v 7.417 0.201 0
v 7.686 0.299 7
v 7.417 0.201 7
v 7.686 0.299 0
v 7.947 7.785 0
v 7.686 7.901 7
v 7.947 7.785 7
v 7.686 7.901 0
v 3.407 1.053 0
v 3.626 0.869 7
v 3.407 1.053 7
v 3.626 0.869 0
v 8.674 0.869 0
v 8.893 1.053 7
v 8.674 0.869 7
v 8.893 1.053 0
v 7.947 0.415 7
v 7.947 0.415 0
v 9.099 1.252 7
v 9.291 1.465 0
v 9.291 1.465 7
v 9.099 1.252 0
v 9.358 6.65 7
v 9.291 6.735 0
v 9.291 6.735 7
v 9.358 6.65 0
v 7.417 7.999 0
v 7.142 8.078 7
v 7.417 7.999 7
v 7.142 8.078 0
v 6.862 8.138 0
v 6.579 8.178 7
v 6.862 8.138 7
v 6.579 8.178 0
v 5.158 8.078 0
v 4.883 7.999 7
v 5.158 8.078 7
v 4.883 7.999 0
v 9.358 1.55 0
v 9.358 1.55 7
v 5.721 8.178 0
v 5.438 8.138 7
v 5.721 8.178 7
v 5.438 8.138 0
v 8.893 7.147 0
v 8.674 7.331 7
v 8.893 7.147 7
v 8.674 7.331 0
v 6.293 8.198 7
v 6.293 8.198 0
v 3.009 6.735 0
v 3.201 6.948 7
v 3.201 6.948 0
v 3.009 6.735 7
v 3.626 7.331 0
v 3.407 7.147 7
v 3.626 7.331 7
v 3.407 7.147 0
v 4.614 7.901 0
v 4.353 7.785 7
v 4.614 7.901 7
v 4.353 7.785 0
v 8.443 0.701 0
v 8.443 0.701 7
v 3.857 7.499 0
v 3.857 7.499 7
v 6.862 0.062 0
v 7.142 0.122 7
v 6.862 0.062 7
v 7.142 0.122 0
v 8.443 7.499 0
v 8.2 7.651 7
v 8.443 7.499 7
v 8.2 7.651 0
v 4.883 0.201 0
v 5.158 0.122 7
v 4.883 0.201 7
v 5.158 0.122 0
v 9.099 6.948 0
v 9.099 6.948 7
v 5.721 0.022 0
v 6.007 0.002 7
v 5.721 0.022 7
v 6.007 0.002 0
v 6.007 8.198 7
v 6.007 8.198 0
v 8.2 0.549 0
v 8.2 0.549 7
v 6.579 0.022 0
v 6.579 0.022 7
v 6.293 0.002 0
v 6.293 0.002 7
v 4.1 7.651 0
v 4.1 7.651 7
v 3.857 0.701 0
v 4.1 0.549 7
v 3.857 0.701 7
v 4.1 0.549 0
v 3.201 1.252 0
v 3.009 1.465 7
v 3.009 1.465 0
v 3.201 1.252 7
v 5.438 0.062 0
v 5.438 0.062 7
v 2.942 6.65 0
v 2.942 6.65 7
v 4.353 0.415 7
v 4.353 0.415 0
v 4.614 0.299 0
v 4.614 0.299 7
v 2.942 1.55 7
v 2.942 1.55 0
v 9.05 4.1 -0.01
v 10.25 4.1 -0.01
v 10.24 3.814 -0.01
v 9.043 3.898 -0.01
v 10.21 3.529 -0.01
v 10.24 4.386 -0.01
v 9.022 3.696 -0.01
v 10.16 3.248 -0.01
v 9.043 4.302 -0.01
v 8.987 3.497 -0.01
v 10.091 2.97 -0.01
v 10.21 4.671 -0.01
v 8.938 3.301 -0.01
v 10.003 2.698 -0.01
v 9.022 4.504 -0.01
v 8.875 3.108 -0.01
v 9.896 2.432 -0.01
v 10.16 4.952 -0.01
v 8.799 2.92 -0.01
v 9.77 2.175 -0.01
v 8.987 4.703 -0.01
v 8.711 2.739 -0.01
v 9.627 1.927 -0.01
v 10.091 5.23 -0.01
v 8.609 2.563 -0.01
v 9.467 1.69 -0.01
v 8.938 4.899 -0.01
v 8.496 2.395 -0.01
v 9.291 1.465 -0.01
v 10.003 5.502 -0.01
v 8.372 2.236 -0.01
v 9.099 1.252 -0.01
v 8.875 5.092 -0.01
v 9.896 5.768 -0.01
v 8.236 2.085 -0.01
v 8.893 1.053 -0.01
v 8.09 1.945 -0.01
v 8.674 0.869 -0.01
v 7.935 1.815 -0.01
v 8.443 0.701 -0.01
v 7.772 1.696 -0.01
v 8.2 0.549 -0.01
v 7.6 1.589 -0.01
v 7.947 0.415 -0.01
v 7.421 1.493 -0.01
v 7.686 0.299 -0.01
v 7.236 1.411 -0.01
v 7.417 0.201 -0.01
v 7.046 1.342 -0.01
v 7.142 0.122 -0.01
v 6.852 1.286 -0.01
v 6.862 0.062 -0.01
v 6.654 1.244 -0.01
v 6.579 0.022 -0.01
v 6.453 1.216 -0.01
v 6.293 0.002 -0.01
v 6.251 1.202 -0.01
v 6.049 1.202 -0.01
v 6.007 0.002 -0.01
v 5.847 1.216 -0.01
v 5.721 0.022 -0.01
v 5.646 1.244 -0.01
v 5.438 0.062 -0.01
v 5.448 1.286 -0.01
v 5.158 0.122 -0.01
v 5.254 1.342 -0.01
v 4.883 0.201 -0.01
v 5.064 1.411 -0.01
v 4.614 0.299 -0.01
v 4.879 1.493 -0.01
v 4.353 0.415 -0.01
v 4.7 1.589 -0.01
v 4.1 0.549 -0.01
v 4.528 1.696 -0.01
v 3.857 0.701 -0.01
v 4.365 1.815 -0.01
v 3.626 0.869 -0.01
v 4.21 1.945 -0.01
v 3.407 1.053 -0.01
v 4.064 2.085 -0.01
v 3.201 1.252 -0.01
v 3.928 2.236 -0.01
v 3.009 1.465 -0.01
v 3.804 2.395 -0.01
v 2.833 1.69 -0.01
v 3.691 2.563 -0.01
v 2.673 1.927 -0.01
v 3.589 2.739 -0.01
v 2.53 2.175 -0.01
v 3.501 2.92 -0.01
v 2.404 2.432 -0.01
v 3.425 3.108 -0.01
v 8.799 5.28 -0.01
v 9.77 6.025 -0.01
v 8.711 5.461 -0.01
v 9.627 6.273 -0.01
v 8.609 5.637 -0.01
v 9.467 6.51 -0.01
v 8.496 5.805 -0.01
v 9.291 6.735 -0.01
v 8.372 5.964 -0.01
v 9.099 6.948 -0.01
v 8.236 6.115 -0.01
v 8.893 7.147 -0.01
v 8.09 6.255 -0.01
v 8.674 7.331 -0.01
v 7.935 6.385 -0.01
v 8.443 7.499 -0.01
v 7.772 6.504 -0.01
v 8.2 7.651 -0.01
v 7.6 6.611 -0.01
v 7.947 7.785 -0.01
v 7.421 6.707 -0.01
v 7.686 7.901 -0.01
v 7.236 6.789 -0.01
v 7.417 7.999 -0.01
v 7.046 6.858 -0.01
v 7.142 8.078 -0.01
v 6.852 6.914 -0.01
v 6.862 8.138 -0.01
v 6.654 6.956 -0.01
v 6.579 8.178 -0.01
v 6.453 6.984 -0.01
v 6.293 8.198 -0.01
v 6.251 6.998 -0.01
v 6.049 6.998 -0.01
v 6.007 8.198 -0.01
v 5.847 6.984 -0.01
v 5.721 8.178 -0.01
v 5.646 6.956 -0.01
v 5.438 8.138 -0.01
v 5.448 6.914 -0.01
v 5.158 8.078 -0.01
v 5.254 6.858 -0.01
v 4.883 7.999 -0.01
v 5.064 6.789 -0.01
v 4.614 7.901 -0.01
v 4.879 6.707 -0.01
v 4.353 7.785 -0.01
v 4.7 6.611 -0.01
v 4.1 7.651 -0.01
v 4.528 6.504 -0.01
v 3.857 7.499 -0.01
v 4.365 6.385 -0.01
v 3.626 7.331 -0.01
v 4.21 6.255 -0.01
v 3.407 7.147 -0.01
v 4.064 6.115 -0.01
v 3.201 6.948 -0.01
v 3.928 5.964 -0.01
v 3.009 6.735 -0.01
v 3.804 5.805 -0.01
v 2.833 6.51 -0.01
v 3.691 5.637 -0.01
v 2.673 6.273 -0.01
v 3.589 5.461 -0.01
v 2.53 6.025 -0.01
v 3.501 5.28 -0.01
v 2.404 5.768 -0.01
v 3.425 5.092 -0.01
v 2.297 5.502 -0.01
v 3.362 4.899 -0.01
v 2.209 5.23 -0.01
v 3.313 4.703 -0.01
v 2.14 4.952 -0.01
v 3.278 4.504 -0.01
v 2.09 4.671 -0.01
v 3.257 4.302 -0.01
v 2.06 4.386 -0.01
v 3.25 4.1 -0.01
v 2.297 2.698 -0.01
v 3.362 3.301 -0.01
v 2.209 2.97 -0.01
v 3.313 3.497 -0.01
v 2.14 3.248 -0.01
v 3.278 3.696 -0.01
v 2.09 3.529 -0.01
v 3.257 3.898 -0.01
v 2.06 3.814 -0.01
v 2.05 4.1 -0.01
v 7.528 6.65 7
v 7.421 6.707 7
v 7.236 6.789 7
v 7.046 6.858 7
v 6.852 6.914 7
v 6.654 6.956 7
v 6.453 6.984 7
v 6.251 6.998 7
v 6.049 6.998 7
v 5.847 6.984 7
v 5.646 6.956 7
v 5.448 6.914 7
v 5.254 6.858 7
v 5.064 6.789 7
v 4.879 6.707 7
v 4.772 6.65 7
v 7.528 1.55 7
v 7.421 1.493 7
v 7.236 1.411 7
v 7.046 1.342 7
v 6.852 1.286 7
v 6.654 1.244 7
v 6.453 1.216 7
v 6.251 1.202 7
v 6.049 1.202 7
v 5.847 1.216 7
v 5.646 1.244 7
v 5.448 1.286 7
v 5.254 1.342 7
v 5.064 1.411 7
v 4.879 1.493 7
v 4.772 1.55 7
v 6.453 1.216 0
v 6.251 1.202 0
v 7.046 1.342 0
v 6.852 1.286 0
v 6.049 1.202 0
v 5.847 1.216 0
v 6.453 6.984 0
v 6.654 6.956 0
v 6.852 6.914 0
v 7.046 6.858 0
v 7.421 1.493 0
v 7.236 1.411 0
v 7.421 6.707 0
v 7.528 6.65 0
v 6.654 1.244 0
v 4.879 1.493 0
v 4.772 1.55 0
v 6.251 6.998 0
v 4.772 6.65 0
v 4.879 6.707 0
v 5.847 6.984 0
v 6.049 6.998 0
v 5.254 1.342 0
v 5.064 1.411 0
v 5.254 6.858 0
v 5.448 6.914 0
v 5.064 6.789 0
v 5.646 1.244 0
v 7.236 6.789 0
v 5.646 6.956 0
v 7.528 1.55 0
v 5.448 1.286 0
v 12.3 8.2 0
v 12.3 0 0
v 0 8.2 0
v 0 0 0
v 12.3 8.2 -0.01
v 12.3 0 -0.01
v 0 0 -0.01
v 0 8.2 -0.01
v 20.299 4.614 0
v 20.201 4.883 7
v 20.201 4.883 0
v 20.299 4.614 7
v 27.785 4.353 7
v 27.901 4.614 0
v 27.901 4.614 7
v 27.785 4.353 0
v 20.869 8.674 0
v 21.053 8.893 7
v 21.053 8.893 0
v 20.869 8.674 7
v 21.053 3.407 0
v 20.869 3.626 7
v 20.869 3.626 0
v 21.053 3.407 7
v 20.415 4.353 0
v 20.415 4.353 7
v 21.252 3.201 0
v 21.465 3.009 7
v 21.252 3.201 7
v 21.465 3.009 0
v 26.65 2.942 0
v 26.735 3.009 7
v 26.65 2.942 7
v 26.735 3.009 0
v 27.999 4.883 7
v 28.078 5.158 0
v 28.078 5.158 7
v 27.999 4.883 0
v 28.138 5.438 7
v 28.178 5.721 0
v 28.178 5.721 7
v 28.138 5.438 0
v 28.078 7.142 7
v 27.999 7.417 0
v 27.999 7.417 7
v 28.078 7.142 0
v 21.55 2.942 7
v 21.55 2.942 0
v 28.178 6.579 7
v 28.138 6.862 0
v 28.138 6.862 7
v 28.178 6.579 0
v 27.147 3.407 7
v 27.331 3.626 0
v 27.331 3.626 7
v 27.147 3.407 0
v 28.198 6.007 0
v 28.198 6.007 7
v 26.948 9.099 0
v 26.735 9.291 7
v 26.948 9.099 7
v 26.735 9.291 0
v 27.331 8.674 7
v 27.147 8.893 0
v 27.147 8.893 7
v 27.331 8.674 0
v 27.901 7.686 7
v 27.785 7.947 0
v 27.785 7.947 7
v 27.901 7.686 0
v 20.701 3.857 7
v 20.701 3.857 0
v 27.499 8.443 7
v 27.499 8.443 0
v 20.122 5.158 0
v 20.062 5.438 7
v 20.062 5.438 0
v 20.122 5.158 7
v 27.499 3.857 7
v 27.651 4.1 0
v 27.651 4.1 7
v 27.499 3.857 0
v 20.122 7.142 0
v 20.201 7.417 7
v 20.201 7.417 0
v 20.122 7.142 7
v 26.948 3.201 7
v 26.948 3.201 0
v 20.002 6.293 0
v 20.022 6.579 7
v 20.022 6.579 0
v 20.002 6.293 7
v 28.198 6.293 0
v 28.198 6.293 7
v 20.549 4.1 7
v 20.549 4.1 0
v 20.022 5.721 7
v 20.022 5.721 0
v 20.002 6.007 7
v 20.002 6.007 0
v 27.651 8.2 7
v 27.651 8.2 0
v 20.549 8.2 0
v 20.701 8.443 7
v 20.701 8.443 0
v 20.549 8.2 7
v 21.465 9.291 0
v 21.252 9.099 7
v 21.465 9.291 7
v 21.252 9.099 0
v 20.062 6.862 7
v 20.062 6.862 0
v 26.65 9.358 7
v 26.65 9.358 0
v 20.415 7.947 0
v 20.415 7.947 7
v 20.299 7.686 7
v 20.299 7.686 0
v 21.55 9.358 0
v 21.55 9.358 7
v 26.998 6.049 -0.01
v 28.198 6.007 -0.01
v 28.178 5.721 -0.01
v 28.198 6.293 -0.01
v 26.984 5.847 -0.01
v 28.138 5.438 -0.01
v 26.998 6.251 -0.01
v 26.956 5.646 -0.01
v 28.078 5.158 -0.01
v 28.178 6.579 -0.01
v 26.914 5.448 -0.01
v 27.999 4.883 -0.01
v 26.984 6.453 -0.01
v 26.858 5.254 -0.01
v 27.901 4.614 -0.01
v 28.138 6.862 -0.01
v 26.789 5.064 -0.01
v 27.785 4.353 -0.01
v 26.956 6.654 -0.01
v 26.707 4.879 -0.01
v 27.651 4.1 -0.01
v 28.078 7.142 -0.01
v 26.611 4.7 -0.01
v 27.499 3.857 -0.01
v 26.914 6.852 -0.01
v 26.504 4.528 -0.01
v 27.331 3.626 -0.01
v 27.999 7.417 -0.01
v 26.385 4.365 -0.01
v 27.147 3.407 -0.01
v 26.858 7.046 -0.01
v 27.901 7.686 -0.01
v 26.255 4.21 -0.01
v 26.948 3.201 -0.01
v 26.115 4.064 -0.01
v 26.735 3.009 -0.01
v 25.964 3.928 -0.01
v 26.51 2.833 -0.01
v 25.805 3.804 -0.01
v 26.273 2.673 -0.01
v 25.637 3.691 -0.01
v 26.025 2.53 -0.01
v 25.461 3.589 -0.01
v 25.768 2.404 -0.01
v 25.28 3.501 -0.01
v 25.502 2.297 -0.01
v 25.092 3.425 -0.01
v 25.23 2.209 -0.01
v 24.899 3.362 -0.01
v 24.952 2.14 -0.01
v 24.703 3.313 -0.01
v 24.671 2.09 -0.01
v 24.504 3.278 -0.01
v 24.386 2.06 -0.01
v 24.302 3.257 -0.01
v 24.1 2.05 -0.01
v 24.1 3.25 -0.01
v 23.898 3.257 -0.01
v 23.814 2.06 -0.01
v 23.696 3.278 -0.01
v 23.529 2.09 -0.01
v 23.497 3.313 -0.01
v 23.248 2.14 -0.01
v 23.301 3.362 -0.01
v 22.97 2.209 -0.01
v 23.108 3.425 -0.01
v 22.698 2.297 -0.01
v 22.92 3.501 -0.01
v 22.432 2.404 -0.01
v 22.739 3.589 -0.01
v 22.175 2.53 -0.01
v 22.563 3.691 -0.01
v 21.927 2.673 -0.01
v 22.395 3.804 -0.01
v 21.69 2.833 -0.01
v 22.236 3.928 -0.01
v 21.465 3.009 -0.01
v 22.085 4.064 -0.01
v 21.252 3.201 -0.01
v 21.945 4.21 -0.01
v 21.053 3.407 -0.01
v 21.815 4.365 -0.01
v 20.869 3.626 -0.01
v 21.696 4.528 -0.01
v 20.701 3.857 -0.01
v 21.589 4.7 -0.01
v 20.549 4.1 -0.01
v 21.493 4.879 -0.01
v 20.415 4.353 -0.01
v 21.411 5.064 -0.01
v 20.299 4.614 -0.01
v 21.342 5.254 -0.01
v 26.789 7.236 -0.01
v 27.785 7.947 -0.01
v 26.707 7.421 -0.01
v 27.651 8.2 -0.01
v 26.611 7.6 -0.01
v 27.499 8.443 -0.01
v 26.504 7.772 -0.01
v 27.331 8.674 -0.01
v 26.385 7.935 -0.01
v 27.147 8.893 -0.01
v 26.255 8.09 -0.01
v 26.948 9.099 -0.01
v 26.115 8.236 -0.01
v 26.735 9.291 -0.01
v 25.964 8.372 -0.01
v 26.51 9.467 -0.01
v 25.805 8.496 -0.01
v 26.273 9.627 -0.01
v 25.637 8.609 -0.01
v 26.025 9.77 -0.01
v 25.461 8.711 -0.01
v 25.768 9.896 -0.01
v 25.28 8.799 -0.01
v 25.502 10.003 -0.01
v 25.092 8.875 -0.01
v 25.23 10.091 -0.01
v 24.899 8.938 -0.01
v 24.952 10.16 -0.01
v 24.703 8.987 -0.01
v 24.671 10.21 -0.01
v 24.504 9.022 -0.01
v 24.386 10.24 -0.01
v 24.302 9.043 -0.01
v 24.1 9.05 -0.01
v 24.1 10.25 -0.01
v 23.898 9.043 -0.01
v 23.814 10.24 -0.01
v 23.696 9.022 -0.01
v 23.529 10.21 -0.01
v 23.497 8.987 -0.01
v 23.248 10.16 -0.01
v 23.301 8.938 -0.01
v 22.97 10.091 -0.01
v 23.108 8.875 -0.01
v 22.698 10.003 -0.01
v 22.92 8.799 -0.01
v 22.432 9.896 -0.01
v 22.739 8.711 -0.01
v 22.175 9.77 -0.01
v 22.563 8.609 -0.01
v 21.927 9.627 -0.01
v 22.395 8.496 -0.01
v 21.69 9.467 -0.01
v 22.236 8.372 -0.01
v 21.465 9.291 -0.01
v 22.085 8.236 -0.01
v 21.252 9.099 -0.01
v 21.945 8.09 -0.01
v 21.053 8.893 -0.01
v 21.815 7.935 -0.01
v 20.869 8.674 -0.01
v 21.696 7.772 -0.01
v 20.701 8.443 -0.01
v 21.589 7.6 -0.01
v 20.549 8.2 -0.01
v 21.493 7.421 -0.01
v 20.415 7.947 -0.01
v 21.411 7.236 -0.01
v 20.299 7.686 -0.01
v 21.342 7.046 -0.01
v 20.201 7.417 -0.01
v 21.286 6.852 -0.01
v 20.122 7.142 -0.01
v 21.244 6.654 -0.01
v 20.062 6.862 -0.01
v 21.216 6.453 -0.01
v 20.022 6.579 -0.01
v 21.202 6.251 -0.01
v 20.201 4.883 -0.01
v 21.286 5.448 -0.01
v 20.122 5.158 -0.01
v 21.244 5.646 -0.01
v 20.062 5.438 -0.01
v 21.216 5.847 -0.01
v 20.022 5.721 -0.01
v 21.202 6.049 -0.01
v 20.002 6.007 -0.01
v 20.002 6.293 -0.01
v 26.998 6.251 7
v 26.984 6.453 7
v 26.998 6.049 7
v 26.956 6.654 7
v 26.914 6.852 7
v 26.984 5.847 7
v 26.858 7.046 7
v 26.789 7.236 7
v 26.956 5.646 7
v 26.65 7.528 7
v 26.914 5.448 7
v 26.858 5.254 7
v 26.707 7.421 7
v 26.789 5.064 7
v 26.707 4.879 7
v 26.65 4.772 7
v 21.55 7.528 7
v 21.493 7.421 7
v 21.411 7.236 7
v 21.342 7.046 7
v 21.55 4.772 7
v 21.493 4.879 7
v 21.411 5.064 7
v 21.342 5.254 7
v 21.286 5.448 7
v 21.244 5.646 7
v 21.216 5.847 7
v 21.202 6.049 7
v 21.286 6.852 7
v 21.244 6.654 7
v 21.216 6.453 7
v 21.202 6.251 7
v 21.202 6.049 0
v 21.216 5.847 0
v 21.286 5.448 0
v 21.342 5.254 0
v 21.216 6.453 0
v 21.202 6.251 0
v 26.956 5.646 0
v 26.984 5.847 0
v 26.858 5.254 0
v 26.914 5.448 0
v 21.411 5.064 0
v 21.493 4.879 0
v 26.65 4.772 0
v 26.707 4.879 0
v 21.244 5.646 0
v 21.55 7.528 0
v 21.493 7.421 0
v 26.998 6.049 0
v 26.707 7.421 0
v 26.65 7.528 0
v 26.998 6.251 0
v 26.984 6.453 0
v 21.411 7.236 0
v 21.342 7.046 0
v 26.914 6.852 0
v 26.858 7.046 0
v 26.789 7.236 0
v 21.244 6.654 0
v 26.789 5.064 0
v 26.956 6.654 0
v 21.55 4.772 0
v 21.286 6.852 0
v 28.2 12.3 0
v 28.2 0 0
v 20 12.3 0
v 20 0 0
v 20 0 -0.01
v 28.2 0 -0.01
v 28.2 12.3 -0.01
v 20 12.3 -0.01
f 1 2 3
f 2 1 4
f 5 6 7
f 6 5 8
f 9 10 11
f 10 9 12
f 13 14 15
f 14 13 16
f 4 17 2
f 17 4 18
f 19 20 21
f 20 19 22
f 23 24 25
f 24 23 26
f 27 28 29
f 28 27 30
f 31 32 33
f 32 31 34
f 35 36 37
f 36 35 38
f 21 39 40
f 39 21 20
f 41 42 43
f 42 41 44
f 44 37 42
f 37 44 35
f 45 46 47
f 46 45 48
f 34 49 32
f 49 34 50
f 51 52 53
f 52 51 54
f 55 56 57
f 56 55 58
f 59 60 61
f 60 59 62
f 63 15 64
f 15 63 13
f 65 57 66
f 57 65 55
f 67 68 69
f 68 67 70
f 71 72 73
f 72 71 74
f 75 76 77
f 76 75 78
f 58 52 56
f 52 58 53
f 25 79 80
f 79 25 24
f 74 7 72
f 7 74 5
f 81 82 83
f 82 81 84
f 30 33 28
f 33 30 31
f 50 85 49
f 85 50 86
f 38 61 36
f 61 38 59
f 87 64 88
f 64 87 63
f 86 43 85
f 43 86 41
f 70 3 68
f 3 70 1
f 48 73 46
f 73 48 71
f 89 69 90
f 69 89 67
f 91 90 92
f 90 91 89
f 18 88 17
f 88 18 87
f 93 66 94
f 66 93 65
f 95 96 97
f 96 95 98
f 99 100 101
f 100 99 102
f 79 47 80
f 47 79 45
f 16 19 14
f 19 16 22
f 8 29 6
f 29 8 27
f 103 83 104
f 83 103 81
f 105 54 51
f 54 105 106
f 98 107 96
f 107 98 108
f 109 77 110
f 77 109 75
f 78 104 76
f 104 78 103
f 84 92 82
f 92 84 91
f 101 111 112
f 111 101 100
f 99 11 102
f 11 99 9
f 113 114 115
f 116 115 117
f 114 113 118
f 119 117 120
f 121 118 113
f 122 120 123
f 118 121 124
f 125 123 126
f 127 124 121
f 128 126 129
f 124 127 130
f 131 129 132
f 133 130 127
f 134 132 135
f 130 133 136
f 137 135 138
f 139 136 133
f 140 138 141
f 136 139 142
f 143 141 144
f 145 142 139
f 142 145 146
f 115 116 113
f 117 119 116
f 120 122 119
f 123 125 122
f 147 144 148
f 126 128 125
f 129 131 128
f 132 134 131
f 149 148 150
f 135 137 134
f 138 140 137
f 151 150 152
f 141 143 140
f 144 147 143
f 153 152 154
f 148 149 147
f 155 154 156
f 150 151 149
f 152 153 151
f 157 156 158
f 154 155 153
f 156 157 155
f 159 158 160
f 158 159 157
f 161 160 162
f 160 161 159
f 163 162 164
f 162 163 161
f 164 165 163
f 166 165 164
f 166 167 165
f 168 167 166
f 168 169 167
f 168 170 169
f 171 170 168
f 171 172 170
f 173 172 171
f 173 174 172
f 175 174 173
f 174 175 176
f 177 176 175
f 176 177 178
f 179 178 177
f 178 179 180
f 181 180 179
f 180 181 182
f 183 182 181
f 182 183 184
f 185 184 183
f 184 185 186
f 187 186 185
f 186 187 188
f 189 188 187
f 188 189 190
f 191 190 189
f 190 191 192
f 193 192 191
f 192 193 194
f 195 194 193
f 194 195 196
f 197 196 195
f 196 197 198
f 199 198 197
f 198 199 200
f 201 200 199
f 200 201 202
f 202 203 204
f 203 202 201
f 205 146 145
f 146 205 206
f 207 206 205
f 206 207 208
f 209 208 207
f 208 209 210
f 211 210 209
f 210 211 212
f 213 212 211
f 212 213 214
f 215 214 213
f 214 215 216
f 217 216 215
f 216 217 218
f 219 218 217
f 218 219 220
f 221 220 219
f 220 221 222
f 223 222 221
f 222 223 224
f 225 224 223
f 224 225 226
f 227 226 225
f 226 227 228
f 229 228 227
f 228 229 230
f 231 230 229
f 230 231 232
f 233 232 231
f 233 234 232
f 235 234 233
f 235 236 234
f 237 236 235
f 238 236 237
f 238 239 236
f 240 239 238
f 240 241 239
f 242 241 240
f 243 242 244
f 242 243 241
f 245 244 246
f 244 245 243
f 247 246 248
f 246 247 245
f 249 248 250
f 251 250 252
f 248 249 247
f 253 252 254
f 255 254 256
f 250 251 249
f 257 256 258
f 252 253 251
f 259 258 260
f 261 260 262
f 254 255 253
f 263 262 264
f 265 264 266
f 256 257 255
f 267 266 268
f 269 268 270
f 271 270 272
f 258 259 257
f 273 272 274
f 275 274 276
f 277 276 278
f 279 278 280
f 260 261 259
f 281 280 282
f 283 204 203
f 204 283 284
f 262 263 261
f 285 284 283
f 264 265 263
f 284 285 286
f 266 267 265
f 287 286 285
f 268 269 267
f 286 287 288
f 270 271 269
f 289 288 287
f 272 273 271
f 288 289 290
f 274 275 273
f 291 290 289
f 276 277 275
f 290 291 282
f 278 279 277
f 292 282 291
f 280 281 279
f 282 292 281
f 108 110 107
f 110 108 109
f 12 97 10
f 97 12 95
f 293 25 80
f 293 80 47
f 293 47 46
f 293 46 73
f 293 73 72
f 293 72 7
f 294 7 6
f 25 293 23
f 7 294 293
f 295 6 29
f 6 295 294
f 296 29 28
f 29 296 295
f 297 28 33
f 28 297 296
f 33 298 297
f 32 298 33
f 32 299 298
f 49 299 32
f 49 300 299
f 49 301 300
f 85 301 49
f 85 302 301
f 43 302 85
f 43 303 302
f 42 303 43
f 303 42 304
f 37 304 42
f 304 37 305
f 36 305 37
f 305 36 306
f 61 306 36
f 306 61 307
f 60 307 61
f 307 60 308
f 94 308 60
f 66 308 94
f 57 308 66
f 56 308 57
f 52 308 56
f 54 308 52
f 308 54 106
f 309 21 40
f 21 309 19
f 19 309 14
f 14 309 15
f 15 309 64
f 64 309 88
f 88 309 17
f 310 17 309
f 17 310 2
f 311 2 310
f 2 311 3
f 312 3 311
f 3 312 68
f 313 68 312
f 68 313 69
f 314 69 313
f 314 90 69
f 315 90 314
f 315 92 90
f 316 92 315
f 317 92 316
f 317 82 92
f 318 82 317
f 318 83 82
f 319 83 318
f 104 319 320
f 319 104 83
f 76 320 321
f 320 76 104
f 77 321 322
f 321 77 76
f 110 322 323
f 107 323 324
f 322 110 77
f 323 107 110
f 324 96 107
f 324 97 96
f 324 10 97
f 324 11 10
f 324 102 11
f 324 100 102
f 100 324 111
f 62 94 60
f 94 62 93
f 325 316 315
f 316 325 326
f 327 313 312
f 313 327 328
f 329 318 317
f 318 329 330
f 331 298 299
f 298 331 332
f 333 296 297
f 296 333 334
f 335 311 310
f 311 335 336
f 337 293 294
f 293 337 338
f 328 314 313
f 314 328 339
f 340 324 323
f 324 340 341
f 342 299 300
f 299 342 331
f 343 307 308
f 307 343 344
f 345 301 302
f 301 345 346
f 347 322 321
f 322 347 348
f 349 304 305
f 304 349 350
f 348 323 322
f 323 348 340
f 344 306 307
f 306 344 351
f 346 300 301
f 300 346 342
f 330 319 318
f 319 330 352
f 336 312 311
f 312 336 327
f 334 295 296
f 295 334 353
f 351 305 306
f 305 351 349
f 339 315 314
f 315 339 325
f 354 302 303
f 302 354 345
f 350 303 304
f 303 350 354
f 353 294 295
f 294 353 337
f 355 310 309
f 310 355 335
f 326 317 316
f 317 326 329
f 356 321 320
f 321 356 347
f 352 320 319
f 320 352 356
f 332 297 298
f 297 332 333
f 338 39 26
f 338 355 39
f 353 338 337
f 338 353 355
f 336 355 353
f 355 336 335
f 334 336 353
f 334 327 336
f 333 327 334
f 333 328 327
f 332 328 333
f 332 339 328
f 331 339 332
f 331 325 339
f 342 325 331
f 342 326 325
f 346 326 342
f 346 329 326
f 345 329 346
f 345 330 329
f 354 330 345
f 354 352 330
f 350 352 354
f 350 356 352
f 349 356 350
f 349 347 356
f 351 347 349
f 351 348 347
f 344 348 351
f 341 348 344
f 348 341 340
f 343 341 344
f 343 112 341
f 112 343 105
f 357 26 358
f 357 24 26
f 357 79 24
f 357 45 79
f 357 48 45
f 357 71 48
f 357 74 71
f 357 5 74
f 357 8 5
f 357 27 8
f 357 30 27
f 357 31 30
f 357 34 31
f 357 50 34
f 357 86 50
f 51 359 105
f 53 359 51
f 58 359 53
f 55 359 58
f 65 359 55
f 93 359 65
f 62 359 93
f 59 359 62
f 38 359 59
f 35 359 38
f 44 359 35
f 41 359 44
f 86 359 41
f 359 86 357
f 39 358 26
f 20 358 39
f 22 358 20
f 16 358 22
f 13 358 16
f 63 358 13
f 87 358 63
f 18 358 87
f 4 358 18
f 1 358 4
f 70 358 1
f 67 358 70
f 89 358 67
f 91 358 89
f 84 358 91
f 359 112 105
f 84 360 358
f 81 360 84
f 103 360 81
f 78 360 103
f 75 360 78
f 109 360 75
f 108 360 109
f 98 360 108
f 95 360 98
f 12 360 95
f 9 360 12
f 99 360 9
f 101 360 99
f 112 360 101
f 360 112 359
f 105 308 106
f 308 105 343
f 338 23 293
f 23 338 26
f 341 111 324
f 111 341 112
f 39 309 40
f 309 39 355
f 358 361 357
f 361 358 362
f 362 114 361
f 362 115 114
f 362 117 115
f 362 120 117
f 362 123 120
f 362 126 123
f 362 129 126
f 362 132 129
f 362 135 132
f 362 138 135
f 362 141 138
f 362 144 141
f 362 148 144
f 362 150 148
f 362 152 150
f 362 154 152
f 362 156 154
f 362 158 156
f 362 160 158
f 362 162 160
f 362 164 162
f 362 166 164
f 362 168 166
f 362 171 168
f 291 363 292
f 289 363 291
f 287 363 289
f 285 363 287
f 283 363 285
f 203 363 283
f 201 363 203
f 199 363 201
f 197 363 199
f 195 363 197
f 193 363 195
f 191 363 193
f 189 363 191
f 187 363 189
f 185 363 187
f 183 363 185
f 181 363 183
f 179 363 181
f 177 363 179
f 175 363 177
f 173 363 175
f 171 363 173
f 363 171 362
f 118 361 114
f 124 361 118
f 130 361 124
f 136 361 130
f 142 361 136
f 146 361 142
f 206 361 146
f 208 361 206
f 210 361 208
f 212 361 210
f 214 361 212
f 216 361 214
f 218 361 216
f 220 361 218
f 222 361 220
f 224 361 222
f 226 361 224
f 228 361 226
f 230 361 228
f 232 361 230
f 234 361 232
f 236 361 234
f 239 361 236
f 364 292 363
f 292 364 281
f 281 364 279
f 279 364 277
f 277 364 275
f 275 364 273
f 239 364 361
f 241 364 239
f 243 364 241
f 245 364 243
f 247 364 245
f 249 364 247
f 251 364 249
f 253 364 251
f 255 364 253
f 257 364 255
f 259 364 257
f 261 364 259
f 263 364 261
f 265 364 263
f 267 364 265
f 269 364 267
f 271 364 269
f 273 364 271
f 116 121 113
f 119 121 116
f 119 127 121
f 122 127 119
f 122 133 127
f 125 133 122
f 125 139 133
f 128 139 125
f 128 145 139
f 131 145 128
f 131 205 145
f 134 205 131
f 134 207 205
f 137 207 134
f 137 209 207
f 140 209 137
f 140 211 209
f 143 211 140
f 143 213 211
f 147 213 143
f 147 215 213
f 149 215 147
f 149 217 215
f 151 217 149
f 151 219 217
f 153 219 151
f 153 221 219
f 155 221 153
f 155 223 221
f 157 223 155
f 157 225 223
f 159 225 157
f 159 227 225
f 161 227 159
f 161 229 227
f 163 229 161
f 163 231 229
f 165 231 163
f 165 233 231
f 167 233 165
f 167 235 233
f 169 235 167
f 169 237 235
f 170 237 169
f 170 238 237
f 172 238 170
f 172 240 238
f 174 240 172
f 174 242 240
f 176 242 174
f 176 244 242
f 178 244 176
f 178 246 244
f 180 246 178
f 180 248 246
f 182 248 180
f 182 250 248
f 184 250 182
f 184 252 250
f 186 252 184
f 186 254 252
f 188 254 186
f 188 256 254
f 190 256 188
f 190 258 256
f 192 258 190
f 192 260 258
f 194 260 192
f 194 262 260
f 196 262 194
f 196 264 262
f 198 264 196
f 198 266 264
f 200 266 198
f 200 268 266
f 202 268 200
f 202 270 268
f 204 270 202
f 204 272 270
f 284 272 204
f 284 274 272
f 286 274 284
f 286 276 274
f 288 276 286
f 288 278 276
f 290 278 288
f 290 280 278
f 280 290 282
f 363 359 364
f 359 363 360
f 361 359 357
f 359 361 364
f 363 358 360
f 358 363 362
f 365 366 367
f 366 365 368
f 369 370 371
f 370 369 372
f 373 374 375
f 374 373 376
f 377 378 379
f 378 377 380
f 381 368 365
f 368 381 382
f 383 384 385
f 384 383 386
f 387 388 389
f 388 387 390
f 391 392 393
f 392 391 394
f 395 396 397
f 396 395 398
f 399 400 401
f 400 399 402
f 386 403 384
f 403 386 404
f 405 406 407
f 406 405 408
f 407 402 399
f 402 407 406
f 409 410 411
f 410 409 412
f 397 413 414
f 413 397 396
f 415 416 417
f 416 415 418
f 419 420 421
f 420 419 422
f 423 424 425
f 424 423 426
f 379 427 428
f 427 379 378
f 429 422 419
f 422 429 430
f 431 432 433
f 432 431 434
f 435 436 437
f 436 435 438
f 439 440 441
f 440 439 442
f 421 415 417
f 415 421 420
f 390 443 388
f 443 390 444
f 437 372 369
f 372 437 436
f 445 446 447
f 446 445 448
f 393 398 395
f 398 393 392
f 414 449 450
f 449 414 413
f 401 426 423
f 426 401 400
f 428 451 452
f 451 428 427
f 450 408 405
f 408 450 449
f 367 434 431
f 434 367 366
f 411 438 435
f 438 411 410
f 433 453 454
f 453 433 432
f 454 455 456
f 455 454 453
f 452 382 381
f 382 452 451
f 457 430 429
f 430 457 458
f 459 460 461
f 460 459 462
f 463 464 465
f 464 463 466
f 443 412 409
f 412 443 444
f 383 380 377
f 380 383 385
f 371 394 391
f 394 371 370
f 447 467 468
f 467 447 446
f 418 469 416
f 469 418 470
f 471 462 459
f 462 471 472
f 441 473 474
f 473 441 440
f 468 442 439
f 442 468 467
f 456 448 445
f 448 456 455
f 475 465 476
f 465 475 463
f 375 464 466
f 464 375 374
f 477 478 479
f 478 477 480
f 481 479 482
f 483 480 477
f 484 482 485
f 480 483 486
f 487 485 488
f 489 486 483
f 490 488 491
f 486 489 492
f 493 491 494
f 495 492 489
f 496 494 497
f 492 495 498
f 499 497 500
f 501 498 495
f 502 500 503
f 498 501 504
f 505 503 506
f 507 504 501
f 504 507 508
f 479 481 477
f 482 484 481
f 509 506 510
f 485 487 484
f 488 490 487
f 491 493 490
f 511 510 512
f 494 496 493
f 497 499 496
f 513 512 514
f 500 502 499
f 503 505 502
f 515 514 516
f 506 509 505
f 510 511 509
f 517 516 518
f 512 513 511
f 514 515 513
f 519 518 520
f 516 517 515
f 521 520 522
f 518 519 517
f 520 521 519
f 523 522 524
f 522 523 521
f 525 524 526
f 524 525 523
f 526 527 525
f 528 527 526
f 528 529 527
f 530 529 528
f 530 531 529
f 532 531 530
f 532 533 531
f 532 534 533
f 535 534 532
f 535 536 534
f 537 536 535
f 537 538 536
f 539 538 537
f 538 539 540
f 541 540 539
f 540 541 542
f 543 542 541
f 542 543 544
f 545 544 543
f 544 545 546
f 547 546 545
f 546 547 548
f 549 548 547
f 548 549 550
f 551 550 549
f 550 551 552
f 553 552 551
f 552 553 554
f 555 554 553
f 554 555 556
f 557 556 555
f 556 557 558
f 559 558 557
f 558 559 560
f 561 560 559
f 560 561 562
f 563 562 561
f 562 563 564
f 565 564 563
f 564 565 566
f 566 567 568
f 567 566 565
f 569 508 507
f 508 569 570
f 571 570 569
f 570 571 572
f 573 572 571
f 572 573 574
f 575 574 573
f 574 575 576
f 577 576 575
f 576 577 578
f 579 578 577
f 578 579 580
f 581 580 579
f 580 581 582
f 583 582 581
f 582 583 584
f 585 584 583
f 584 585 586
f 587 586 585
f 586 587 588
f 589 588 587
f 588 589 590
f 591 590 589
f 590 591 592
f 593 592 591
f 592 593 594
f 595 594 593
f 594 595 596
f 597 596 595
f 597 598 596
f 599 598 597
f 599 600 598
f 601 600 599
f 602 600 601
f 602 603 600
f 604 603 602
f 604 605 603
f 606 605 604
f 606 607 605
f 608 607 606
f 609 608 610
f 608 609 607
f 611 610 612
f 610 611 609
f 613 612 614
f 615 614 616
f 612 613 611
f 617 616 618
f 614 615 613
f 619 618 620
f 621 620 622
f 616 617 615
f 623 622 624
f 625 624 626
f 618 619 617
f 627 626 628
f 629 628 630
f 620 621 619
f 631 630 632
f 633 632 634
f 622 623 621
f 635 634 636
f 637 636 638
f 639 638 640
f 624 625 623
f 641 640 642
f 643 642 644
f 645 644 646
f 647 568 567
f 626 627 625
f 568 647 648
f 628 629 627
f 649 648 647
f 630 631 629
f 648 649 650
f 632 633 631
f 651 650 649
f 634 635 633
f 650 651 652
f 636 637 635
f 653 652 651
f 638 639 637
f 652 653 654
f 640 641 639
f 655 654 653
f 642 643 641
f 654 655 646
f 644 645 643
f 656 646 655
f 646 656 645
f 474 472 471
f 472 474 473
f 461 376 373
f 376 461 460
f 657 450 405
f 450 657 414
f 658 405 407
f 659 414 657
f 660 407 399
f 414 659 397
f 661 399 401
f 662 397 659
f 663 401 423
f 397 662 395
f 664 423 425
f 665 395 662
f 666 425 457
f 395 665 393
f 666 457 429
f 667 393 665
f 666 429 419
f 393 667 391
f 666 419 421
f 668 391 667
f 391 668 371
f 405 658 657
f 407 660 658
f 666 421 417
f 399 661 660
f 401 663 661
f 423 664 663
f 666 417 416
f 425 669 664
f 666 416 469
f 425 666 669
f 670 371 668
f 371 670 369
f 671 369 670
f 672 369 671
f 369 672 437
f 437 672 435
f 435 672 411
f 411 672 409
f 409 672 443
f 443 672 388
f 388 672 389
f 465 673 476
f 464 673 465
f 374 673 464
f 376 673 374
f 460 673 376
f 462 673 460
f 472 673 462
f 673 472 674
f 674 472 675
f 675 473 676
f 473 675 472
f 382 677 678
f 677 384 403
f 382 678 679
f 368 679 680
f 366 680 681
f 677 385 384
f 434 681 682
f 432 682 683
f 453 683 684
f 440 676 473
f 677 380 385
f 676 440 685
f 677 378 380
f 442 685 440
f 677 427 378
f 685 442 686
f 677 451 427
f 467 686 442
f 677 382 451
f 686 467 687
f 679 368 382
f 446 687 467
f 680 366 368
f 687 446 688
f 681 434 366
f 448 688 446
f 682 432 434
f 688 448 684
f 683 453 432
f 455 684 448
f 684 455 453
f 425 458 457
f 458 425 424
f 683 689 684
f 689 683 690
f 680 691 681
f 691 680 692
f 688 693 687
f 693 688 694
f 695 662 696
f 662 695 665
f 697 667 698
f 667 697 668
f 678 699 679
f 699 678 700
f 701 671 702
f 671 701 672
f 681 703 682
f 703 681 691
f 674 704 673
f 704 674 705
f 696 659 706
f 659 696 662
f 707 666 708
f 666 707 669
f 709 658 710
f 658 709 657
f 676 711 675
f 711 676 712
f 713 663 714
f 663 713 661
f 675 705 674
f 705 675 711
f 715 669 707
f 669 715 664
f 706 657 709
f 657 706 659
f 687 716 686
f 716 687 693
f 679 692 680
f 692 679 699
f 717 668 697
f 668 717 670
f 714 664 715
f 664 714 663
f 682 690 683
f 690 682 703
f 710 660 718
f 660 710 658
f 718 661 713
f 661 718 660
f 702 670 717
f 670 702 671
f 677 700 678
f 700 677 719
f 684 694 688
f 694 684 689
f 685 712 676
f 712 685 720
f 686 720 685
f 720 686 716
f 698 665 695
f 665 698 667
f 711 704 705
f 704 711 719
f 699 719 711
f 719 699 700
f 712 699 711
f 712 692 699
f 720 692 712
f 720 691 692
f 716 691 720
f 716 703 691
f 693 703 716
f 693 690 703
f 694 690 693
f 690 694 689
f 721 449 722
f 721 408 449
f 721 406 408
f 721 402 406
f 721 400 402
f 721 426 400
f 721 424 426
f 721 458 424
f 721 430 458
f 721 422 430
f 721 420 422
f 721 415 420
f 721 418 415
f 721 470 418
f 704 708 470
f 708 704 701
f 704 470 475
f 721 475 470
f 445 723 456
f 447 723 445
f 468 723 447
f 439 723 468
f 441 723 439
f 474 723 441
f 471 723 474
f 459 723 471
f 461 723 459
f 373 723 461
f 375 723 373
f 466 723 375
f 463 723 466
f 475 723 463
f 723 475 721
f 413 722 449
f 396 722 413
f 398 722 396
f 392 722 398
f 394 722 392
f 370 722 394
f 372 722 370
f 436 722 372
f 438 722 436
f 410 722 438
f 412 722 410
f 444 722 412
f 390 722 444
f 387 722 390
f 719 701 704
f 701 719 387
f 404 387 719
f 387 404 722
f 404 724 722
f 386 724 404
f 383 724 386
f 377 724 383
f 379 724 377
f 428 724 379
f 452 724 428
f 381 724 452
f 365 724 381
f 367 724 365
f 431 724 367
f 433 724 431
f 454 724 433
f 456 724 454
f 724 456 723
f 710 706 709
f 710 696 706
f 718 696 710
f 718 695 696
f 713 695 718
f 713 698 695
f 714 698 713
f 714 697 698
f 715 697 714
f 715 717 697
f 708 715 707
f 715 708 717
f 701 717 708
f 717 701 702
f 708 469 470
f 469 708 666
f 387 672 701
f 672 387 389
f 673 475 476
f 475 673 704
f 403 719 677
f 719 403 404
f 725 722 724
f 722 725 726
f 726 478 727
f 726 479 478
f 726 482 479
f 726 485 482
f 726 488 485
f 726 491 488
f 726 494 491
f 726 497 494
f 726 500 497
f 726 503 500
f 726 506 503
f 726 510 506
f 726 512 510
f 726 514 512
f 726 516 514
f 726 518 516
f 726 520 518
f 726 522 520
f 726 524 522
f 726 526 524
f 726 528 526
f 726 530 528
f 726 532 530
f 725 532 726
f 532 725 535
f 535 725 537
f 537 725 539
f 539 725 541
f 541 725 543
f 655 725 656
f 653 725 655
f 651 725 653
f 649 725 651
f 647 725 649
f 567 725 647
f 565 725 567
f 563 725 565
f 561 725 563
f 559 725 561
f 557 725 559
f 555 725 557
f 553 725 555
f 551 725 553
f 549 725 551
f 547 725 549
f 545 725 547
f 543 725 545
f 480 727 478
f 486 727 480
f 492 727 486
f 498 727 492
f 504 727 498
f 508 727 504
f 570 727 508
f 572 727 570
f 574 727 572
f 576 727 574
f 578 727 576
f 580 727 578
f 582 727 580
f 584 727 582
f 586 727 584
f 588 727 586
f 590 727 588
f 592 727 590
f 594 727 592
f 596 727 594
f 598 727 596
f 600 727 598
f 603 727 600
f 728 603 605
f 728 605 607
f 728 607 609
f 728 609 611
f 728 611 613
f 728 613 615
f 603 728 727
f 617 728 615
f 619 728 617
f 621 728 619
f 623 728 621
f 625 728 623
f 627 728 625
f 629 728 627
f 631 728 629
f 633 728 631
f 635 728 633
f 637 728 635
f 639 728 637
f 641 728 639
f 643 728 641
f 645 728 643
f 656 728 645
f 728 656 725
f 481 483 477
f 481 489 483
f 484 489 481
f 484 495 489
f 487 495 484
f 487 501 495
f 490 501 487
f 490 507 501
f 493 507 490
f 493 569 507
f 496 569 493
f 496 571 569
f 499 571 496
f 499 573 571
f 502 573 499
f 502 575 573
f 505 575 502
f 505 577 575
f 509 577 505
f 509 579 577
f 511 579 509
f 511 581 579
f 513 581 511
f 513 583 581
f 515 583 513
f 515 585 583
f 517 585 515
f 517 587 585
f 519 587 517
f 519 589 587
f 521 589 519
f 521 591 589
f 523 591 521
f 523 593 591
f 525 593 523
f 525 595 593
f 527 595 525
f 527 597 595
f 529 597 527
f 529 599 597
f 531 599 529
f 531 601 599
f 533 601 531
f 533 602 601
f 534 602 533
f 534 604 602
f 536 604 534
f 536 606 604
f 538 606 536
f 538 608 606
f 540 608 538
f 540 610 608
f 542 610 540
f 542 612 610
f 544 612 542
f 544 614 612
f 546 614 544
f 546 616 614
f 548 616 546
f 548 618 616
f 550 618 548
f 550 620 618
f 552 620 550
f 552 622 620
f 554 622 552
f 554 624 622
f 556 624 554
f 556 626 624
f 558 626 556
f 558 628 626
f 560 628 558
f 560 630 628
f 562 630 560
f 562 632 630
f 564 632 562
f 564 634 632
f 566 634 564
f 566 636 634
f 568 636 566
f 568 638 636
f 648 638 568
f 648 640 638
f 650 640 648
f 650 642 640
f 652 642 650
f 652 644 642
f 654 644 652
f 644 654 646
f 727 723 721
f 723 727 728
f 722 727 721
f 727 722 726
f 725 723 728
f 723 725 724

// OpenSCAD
// file: ../../Base/Boxes.scad
// Fischertechnik Box Foundation
// Pre-designed Boxes

use <Constants.scad>

include <PlacementOptions.scad>

box190Width = 190;
box190Depth = 130;
box130Width = 130;
box130Depth = 95;
boxUsageHeight = 33.9;
boxWallThickness = 2.4;
boxBaseThickness = 1.0;

// getBoxWallThickness()
// Gets the wall thickness of a Fischertechnik Box

function getBoxWallThickness() = boxWallThickness;

// Gets the usable height of a fischertechnik box
function getBoxUsageHeight() = boxUsageHeight;

// Gets the thickness of the Fischertechnik box base.
function getBoxBaseThickness() = boxBaseThickness;

// Gets the usable inner space of a Box 190 as an x/y-list
function getBox190Space() = [
    box190Width - 2*getBoxWallThickness(), 
    box190Depth - 2*getBoxWallThickness() ];

// Imports the Fischertechnik empty box 130x190 mm and places it at position 0,0
// 190x130 are the outer sizes, the inner space is slightly smaller. Use getBox190Space() to get the inner sizes.
// This module needs the STL file "Fischertechnik Box 130x190.stl" in the library path.
// The box is positioned that the usable inner space is at the 0,0,0 position. The

module Box190() {
    translate([-getBoxWallThickness(),-getBoxWallThickness(),-getBoxBaseThickness()])
        import("Fischertechnik Box 130x190.stl", convexity=3);
}

// Gets the usable inner space of a Box 130 as an x/y-list
function getBox130Space() = [
    box130Width - 2*getBoxWallThickness(), 
    box130Depth - 2*getBoxWallThickness() ];

// Imports the Fischertechnik empty box 95x130 mm and places it at position 0,0
// 190x130 are the outer sizes, the inner space is slightly smaller. Use getBox190Space() to get the inner sizes.
// This module needs the STL file "Fischertechnik Box 95x130.stl" in the library path.
// The box is positioned that the usable inner space is at the 0,0,0 position. The

module Box130() {
    translate([-getBoxWallThickness(),-getBoxWallThickness(),-getBoxBaseThickness()])
        import("Fischertechnik Box 95x130.stl", convexity=3);
}

// Creates a web at the specified box walls
// corner 0 = LowerLeft, 1 = UpperLeft, 2 = UpperRight, 3 = LowerRight
// side 0 = LeftOfCorner, 1 = RightOfCorner
// distance = Distance in mm from the corner
// box = inner width and depth of the box (default: Box 190)
// webWidth = length of the web (default is 3 mms)
// webThickness = thickness of the web (default is 1 mm)

module BoxWeb(corner, side, distance, box=getBox190Space(), webWidth=3, webThickness=1.0) {
    sink = getBoxWallThickness()/2;

    width = (corner % 2 == 0) ? 
            (side == LeftOfCorner ? webWidth : webThickness) :
            (side == LeftOfCorner ? webThickness : webWidth);

    depth = (corner % 2 == 0) ? 
            (side == RightOfCorner ? webWidth : webThickness) :
            (side == RightOfCorner ? webThickness : webWidth);
    
    xDiff = corner == LowerLeft ? 
                (side == LeftOfCorner ? -sink : distance) :
            (corner == UpperLeft ?                
                (side == LeftOfCorner ? distance : -sink) :
            (corner == UpperRight ?
                (side == LeftOfCorner ? box.x-webWidth+sink : box.x-distance-webThickness) :
                (side == LeftOfCorner ? box.x-distance-webThickness: box.x-webWidth+sink)));

    yDiff = corner == LowerLeft ? 
                (side == RightOfCorner ? -sink : distance) :
            (corner == UpperLeft ?
                (side == RightOfCorner ? box.y-distance : box.y-webWidth+sink) :
            (corner == UpperRight ?
                (side == RightOfCorner ? box.y-webWidth+sink : box.y-distance) :
                (side == RightOfCorner ? distance : -sink)));
    
    translate([xDiff, yDiff, -getExcess()])
        cube([width, depth, boxUsageHeight + 2*getExcess()]);
}
// file: ../../Base/Rotation.scad
// Fischertechnik Box Foundation
// Geometry Helpers Rotation

include <PlacementOptions.scad>

// getRotatedSpace(space, rotation=NoRotation)
// Rotates the space dependent on the specified rotation

function getRotatedSpace(space, rotation=NoRotation) = [
    (rotation == Rotate90 || rotation == Rotate270) ? space.y : space.x,
    (rotation == Rotate90 || rotation == Rotate270) ? space.x : space.y
];

// Rotates the given space around the fixed left lower corner
// space = the space the children needs as width/depth list [width,depth]
// rotation = 0 Rotate0 degrees, 1 Rotate90 degrees, 2 Rotate180 degrees, 3 Rotate270 degrees (equivalent to -90)

module RotateFix(space, rotation=Rotate0) {
    dy = (rotation == Rotate0 || rotation == Rotate270) ? 0 :
        (rotation == Rotate90) ? space.x :
        space.y;
    dx = (rotation < Rotate180) ? 0 :
        (rotation == Rotate180) ? space.x :
        space.y;
    
    translate([dx, dy, 0])
        rotate([0, 0, rotations[rotation]])
            children();
}
// file: ../../Base/Alignment.scad
// Fischertechnik Box Foundation
// Geometry Helpers Alignment

include <PlacementOptions.scad>

// getAlignedX(elementWidth, spaceWidth, align=AlignRight, offset=0)
// Gets the aligned X offset of an element with the given
// width in the given space.
// elementWidth = The width of the element to positon
// spaceWidth = The space where the element should be aligned
// align = 0 AlignLeft, 1 AlignCenter, 2 AlignRight
// offset = an optional offset from the aligned position. When
// aligned left or centered, then positive values are in X direction.
// When aligned right then positive values are in negative X direction.

function getAlignedX(elementWidth, spaceWidth, align=AlignRight, offset=0) =
    (align == AlignLeft) ?
        offset :
        ((align == AlignCenter) ?
        (spaceWidth - elementWidth)/2 + offset :
        spaceWidth - offset - elementWidth);

// getAlignedY(elementDepth, spaceDepth, align=AlignTop, offset=0)
// Gets the aligned Y offset of an element with the given
// depth in the given space.
// elementDepth = The depth of the element to positon
// spaceDepth = The space where the element should be aligned
// align = 0 AlignBottom, 1 AlignCenter, 2 AlignTop
// offset = an optional offset from the aligned position. When
// aligned bottom or centered, then positive values are in Y direction.
// When aligned top then positive values are in negative Y direction.

function getAlignedY(elementDepth, spaceDepth, align=AlignTop, offset=0) =
    (align == AlignBottom) ?
        offset :
        ((align == AlignCenter) ?
        (spaceDepth - elementDepth)/2 + offset :
        spaceDepth - offset - elementDepth);
// file: ../../Base/Constants.scad
// Fischertechnik Box Foundation
// Constants

// Constant values necessary for multiple elements

// Base constants
dividerThickness = 1.2;
excess = 0.01;
fragments = 90;
tolerance = 0.8;

// Gets the thickness of a divider 
function getDividerThickness() = dividerThickness;

// Gets the excess that is used to merge walls into each other
function getExcess() = excess;

// Gets amount of fragments of a cylinder
function getFragments() = fragments;

// Gets the inner tolerance of a frame to each side
function getTolerance() = tolerance;


// Fischertechnik specific constants
axisDiameter = 4;
axisBottomDiameter = axisDiameter + 1;
standardEdgeDistance = 2.5;
standardWebDistance = 11.5;
standardCornerLength = 15;
tubeWallFactor = 1.6;

// Gets axis diameter
function getAxisDiameter() = axisDiameter;

// Gets axis bottom diameter for thicker part at the bottom
function getAxisBottomDiameter() = axisBottomDiameter;

// gets the standard distance to the wall of the box for dockable frames with webs
function getStandardEdgeDistance() = standardEdgeDistance;

// gets the standard distance of each web to the corner of the dockable frame
function getStandardWebDistance() = standardWebDistance;

// gets the standard length of the corner walls of a dockable frame
function getStandardCornerLength() = standardCornerLength;

// gets the wall thickness of a tube.
function getTubeWallThickness() = tubeWallFactor * getDividerThickness();
// file: ../../Base/PlacementOptions.scad
// Fischertechnik Box Foundation
// Placement Options

// Alignment
NoAlign = 0;
AlignLeft = 1;
AlignBottom = 2;
AlignCenter = 3;
AlignRight = 4;
AlignTop = 5;

// Element rotation degree steps
rotations = [0, -90, -180, -270];

// Rotation
NoRotation = 0;
Rotate0 = 0;
Rotate90 = 1;
Rotate180 = 2;
Rotate270 = 3;

// Docking (seen from above)
NoDock = -1;
DockLeft = 0;
DockTop = 1;
DockRight = 2;
DockCorner = 2;
DockBottom = 3;

// Web corners
LowerLeft = 0;
UpperLeft = 1;
UpperRight = 2;
LowerRight = 3;

// Web position relative to corner
LeftOfCorner = 0;
RightOfCorner = 1;
// file: ../../Elements/HolderBulbLamp.scad
// Fischertechnik Box Library
// Holder for bulb lamp and lens tip lamp
// 37869, 37875

use <../Base/Constants.scad>
use <../Base/Placement.scad>
use <../ModelBase/Simple.scad>

width = 11.5;
depth = 5.8;

// getHolderBulbLampSpace()
// Gets the space the bulb lamp holder needs as width and depth (.x and .y as a list)

function getHolderBulbLampSpace() = [width + getTolerance(), depth + 2*getDividerThickness()];

// HolderBulbLamp()
// Holder for a bulb lamp.

module HolderBulbLamp() {
    height = 7.0;
    cutoffDepth = 5.1;
    $fn = getFragments();
    diameter = depth + 2*getDividerThickness();

    module BulbCylinder() {
        Center(getHolderBulbLampSpace())
        {        
            difference() {
                cylinder(h = height + getExcess(), d = depth + 2*getDividerThickness());
                cylinder(h = height + 2*getExcess(), d = depth);
            }
        }
    }

    Space(getHolderBulbLampSpace());
    
    difference() {
        translate([0, 0, -getExcess()])
            BulbCylinder();
        translate([0, (getHolderBulbLampSpace().y-cutoffDepth)/2])
            cube([getHolderBulbLampSpace().x, cutoffDepth, height + 1]);
    }
}


// Tests
color("lightgray") {
HolderBulbLamp();
}
// file: ../../Base/Placement.scad
// Fischertechnik Box Foundation
// Geometry Helpers Placement

use <Constants.scad>
use <Alignment.scad>
use <Rotation.scad>
use <Boxes.scad>

include <PlacementOptions.scad>

// Place(x=0, y=0, elementSpace=[0,0], alignX=AlignLeft, alignY=AlignBottom, rotation=Rotate0, boxSpace=getBox190Space())
// Places the child at the specified position
// y = Y-Position. This is a relative position when an X aligment is specified.
// x = X-Position. This is a relative position when an Y aligment is specified.
// elementSpace = space of the element to be placed [x,y]
// alignX = -1=NoAlign, 0 AlignLeft, 1 AlignCenter, 3 AlignRight (elementSpace and boxSpace required!)
// alignY = -1=NoAlign, 2 AlignBottom, 1 AlignCenter, 4 AlignTop (elementSpace and boxSpace required!)
// rotation = 0 Rotate0 0 degrees, 1 Rotate90 90 degrees, 
// 2 Rotate180 180 degrees, 3 Rotate270 270 degrees (equivalent to -90)
// boxSpace = Inner space of the box where the placement occurs [x,y] - default is Box 190x130 inner space

module Place(x=0, y=0, elementSpace=[0,0], 
  alignX=AlignLeft, alignY=AlignBottom, 
  rotation=NoRotation, boxSpace=getBox190Space()) {

    module Position(x, y, space, rotation=Rotate0) {
        translate([x, y, 0])
            RotateFix(space, rotation)
                children(0);
    }

    space = getRotatedSpace(elementSpace, rotation);
    alignedX = getAlignedX(space.x, boxSpace.x, alignX, x);
    alignedY = getAlignedY(space.y, boxSpace.y, alignY, y);
    Position(alignedX, alignedY, elementSpace, rotation)
        children(0);
}

// Center(space=getBox130Space(), elementSpace=[0,0])
// space = Space where the children is centered. For cylinder use centered=true and no elementSpace.
// elementSpace = space of the element to be centered [x,y]

module Center(space=getBox190Space(), elementSpace=[0,0]) {
    translate([(space.x - elementSpace.x) / 2, (space.y - elementSpace.y) / 2])
        children(0);
}

// CenterHorizontal(width=0, y=0, offset=0, space=getBox130Space())
// space = Space where the children is centered. For cylinder use centered=true and no elementSpace.
// elementSpace = space of the element to be centered [x,y]

module CenterHorizontal(width=0, y=0, offset=0, space=getBox190Space()) {
    translate([(space.x - width) / 2 + offset, y])
        children(0);
}

// CenterVertical(depth=0, x=0, offset=0, space=getBox130Space())
// space = Space where the children is centered. For cylinder use centered=true and no elementSpace.
// elementSpace = space of the element to be centered [x,y]

module CenterVerticalal(depth=0, x=0, offset=0, space=getBox190Space()) {
    translate([x, (space.y - depth) / 2 + offset])
        children(0);
}
// main file
// Fischertechnik Box Foundation
// Elements
// Test HolderBulbLamp

use <../../Base/Placement.scad>
use <../../Elements/HolderBulbLamp.scad>

include <../../Base/PlacementOptions.scad>

HolderBulbLamp();

Place(20, 0, elementSpace=getHolderBulbLampSpace(), rotation=Rotate90)
    HolderBulbLamp();
